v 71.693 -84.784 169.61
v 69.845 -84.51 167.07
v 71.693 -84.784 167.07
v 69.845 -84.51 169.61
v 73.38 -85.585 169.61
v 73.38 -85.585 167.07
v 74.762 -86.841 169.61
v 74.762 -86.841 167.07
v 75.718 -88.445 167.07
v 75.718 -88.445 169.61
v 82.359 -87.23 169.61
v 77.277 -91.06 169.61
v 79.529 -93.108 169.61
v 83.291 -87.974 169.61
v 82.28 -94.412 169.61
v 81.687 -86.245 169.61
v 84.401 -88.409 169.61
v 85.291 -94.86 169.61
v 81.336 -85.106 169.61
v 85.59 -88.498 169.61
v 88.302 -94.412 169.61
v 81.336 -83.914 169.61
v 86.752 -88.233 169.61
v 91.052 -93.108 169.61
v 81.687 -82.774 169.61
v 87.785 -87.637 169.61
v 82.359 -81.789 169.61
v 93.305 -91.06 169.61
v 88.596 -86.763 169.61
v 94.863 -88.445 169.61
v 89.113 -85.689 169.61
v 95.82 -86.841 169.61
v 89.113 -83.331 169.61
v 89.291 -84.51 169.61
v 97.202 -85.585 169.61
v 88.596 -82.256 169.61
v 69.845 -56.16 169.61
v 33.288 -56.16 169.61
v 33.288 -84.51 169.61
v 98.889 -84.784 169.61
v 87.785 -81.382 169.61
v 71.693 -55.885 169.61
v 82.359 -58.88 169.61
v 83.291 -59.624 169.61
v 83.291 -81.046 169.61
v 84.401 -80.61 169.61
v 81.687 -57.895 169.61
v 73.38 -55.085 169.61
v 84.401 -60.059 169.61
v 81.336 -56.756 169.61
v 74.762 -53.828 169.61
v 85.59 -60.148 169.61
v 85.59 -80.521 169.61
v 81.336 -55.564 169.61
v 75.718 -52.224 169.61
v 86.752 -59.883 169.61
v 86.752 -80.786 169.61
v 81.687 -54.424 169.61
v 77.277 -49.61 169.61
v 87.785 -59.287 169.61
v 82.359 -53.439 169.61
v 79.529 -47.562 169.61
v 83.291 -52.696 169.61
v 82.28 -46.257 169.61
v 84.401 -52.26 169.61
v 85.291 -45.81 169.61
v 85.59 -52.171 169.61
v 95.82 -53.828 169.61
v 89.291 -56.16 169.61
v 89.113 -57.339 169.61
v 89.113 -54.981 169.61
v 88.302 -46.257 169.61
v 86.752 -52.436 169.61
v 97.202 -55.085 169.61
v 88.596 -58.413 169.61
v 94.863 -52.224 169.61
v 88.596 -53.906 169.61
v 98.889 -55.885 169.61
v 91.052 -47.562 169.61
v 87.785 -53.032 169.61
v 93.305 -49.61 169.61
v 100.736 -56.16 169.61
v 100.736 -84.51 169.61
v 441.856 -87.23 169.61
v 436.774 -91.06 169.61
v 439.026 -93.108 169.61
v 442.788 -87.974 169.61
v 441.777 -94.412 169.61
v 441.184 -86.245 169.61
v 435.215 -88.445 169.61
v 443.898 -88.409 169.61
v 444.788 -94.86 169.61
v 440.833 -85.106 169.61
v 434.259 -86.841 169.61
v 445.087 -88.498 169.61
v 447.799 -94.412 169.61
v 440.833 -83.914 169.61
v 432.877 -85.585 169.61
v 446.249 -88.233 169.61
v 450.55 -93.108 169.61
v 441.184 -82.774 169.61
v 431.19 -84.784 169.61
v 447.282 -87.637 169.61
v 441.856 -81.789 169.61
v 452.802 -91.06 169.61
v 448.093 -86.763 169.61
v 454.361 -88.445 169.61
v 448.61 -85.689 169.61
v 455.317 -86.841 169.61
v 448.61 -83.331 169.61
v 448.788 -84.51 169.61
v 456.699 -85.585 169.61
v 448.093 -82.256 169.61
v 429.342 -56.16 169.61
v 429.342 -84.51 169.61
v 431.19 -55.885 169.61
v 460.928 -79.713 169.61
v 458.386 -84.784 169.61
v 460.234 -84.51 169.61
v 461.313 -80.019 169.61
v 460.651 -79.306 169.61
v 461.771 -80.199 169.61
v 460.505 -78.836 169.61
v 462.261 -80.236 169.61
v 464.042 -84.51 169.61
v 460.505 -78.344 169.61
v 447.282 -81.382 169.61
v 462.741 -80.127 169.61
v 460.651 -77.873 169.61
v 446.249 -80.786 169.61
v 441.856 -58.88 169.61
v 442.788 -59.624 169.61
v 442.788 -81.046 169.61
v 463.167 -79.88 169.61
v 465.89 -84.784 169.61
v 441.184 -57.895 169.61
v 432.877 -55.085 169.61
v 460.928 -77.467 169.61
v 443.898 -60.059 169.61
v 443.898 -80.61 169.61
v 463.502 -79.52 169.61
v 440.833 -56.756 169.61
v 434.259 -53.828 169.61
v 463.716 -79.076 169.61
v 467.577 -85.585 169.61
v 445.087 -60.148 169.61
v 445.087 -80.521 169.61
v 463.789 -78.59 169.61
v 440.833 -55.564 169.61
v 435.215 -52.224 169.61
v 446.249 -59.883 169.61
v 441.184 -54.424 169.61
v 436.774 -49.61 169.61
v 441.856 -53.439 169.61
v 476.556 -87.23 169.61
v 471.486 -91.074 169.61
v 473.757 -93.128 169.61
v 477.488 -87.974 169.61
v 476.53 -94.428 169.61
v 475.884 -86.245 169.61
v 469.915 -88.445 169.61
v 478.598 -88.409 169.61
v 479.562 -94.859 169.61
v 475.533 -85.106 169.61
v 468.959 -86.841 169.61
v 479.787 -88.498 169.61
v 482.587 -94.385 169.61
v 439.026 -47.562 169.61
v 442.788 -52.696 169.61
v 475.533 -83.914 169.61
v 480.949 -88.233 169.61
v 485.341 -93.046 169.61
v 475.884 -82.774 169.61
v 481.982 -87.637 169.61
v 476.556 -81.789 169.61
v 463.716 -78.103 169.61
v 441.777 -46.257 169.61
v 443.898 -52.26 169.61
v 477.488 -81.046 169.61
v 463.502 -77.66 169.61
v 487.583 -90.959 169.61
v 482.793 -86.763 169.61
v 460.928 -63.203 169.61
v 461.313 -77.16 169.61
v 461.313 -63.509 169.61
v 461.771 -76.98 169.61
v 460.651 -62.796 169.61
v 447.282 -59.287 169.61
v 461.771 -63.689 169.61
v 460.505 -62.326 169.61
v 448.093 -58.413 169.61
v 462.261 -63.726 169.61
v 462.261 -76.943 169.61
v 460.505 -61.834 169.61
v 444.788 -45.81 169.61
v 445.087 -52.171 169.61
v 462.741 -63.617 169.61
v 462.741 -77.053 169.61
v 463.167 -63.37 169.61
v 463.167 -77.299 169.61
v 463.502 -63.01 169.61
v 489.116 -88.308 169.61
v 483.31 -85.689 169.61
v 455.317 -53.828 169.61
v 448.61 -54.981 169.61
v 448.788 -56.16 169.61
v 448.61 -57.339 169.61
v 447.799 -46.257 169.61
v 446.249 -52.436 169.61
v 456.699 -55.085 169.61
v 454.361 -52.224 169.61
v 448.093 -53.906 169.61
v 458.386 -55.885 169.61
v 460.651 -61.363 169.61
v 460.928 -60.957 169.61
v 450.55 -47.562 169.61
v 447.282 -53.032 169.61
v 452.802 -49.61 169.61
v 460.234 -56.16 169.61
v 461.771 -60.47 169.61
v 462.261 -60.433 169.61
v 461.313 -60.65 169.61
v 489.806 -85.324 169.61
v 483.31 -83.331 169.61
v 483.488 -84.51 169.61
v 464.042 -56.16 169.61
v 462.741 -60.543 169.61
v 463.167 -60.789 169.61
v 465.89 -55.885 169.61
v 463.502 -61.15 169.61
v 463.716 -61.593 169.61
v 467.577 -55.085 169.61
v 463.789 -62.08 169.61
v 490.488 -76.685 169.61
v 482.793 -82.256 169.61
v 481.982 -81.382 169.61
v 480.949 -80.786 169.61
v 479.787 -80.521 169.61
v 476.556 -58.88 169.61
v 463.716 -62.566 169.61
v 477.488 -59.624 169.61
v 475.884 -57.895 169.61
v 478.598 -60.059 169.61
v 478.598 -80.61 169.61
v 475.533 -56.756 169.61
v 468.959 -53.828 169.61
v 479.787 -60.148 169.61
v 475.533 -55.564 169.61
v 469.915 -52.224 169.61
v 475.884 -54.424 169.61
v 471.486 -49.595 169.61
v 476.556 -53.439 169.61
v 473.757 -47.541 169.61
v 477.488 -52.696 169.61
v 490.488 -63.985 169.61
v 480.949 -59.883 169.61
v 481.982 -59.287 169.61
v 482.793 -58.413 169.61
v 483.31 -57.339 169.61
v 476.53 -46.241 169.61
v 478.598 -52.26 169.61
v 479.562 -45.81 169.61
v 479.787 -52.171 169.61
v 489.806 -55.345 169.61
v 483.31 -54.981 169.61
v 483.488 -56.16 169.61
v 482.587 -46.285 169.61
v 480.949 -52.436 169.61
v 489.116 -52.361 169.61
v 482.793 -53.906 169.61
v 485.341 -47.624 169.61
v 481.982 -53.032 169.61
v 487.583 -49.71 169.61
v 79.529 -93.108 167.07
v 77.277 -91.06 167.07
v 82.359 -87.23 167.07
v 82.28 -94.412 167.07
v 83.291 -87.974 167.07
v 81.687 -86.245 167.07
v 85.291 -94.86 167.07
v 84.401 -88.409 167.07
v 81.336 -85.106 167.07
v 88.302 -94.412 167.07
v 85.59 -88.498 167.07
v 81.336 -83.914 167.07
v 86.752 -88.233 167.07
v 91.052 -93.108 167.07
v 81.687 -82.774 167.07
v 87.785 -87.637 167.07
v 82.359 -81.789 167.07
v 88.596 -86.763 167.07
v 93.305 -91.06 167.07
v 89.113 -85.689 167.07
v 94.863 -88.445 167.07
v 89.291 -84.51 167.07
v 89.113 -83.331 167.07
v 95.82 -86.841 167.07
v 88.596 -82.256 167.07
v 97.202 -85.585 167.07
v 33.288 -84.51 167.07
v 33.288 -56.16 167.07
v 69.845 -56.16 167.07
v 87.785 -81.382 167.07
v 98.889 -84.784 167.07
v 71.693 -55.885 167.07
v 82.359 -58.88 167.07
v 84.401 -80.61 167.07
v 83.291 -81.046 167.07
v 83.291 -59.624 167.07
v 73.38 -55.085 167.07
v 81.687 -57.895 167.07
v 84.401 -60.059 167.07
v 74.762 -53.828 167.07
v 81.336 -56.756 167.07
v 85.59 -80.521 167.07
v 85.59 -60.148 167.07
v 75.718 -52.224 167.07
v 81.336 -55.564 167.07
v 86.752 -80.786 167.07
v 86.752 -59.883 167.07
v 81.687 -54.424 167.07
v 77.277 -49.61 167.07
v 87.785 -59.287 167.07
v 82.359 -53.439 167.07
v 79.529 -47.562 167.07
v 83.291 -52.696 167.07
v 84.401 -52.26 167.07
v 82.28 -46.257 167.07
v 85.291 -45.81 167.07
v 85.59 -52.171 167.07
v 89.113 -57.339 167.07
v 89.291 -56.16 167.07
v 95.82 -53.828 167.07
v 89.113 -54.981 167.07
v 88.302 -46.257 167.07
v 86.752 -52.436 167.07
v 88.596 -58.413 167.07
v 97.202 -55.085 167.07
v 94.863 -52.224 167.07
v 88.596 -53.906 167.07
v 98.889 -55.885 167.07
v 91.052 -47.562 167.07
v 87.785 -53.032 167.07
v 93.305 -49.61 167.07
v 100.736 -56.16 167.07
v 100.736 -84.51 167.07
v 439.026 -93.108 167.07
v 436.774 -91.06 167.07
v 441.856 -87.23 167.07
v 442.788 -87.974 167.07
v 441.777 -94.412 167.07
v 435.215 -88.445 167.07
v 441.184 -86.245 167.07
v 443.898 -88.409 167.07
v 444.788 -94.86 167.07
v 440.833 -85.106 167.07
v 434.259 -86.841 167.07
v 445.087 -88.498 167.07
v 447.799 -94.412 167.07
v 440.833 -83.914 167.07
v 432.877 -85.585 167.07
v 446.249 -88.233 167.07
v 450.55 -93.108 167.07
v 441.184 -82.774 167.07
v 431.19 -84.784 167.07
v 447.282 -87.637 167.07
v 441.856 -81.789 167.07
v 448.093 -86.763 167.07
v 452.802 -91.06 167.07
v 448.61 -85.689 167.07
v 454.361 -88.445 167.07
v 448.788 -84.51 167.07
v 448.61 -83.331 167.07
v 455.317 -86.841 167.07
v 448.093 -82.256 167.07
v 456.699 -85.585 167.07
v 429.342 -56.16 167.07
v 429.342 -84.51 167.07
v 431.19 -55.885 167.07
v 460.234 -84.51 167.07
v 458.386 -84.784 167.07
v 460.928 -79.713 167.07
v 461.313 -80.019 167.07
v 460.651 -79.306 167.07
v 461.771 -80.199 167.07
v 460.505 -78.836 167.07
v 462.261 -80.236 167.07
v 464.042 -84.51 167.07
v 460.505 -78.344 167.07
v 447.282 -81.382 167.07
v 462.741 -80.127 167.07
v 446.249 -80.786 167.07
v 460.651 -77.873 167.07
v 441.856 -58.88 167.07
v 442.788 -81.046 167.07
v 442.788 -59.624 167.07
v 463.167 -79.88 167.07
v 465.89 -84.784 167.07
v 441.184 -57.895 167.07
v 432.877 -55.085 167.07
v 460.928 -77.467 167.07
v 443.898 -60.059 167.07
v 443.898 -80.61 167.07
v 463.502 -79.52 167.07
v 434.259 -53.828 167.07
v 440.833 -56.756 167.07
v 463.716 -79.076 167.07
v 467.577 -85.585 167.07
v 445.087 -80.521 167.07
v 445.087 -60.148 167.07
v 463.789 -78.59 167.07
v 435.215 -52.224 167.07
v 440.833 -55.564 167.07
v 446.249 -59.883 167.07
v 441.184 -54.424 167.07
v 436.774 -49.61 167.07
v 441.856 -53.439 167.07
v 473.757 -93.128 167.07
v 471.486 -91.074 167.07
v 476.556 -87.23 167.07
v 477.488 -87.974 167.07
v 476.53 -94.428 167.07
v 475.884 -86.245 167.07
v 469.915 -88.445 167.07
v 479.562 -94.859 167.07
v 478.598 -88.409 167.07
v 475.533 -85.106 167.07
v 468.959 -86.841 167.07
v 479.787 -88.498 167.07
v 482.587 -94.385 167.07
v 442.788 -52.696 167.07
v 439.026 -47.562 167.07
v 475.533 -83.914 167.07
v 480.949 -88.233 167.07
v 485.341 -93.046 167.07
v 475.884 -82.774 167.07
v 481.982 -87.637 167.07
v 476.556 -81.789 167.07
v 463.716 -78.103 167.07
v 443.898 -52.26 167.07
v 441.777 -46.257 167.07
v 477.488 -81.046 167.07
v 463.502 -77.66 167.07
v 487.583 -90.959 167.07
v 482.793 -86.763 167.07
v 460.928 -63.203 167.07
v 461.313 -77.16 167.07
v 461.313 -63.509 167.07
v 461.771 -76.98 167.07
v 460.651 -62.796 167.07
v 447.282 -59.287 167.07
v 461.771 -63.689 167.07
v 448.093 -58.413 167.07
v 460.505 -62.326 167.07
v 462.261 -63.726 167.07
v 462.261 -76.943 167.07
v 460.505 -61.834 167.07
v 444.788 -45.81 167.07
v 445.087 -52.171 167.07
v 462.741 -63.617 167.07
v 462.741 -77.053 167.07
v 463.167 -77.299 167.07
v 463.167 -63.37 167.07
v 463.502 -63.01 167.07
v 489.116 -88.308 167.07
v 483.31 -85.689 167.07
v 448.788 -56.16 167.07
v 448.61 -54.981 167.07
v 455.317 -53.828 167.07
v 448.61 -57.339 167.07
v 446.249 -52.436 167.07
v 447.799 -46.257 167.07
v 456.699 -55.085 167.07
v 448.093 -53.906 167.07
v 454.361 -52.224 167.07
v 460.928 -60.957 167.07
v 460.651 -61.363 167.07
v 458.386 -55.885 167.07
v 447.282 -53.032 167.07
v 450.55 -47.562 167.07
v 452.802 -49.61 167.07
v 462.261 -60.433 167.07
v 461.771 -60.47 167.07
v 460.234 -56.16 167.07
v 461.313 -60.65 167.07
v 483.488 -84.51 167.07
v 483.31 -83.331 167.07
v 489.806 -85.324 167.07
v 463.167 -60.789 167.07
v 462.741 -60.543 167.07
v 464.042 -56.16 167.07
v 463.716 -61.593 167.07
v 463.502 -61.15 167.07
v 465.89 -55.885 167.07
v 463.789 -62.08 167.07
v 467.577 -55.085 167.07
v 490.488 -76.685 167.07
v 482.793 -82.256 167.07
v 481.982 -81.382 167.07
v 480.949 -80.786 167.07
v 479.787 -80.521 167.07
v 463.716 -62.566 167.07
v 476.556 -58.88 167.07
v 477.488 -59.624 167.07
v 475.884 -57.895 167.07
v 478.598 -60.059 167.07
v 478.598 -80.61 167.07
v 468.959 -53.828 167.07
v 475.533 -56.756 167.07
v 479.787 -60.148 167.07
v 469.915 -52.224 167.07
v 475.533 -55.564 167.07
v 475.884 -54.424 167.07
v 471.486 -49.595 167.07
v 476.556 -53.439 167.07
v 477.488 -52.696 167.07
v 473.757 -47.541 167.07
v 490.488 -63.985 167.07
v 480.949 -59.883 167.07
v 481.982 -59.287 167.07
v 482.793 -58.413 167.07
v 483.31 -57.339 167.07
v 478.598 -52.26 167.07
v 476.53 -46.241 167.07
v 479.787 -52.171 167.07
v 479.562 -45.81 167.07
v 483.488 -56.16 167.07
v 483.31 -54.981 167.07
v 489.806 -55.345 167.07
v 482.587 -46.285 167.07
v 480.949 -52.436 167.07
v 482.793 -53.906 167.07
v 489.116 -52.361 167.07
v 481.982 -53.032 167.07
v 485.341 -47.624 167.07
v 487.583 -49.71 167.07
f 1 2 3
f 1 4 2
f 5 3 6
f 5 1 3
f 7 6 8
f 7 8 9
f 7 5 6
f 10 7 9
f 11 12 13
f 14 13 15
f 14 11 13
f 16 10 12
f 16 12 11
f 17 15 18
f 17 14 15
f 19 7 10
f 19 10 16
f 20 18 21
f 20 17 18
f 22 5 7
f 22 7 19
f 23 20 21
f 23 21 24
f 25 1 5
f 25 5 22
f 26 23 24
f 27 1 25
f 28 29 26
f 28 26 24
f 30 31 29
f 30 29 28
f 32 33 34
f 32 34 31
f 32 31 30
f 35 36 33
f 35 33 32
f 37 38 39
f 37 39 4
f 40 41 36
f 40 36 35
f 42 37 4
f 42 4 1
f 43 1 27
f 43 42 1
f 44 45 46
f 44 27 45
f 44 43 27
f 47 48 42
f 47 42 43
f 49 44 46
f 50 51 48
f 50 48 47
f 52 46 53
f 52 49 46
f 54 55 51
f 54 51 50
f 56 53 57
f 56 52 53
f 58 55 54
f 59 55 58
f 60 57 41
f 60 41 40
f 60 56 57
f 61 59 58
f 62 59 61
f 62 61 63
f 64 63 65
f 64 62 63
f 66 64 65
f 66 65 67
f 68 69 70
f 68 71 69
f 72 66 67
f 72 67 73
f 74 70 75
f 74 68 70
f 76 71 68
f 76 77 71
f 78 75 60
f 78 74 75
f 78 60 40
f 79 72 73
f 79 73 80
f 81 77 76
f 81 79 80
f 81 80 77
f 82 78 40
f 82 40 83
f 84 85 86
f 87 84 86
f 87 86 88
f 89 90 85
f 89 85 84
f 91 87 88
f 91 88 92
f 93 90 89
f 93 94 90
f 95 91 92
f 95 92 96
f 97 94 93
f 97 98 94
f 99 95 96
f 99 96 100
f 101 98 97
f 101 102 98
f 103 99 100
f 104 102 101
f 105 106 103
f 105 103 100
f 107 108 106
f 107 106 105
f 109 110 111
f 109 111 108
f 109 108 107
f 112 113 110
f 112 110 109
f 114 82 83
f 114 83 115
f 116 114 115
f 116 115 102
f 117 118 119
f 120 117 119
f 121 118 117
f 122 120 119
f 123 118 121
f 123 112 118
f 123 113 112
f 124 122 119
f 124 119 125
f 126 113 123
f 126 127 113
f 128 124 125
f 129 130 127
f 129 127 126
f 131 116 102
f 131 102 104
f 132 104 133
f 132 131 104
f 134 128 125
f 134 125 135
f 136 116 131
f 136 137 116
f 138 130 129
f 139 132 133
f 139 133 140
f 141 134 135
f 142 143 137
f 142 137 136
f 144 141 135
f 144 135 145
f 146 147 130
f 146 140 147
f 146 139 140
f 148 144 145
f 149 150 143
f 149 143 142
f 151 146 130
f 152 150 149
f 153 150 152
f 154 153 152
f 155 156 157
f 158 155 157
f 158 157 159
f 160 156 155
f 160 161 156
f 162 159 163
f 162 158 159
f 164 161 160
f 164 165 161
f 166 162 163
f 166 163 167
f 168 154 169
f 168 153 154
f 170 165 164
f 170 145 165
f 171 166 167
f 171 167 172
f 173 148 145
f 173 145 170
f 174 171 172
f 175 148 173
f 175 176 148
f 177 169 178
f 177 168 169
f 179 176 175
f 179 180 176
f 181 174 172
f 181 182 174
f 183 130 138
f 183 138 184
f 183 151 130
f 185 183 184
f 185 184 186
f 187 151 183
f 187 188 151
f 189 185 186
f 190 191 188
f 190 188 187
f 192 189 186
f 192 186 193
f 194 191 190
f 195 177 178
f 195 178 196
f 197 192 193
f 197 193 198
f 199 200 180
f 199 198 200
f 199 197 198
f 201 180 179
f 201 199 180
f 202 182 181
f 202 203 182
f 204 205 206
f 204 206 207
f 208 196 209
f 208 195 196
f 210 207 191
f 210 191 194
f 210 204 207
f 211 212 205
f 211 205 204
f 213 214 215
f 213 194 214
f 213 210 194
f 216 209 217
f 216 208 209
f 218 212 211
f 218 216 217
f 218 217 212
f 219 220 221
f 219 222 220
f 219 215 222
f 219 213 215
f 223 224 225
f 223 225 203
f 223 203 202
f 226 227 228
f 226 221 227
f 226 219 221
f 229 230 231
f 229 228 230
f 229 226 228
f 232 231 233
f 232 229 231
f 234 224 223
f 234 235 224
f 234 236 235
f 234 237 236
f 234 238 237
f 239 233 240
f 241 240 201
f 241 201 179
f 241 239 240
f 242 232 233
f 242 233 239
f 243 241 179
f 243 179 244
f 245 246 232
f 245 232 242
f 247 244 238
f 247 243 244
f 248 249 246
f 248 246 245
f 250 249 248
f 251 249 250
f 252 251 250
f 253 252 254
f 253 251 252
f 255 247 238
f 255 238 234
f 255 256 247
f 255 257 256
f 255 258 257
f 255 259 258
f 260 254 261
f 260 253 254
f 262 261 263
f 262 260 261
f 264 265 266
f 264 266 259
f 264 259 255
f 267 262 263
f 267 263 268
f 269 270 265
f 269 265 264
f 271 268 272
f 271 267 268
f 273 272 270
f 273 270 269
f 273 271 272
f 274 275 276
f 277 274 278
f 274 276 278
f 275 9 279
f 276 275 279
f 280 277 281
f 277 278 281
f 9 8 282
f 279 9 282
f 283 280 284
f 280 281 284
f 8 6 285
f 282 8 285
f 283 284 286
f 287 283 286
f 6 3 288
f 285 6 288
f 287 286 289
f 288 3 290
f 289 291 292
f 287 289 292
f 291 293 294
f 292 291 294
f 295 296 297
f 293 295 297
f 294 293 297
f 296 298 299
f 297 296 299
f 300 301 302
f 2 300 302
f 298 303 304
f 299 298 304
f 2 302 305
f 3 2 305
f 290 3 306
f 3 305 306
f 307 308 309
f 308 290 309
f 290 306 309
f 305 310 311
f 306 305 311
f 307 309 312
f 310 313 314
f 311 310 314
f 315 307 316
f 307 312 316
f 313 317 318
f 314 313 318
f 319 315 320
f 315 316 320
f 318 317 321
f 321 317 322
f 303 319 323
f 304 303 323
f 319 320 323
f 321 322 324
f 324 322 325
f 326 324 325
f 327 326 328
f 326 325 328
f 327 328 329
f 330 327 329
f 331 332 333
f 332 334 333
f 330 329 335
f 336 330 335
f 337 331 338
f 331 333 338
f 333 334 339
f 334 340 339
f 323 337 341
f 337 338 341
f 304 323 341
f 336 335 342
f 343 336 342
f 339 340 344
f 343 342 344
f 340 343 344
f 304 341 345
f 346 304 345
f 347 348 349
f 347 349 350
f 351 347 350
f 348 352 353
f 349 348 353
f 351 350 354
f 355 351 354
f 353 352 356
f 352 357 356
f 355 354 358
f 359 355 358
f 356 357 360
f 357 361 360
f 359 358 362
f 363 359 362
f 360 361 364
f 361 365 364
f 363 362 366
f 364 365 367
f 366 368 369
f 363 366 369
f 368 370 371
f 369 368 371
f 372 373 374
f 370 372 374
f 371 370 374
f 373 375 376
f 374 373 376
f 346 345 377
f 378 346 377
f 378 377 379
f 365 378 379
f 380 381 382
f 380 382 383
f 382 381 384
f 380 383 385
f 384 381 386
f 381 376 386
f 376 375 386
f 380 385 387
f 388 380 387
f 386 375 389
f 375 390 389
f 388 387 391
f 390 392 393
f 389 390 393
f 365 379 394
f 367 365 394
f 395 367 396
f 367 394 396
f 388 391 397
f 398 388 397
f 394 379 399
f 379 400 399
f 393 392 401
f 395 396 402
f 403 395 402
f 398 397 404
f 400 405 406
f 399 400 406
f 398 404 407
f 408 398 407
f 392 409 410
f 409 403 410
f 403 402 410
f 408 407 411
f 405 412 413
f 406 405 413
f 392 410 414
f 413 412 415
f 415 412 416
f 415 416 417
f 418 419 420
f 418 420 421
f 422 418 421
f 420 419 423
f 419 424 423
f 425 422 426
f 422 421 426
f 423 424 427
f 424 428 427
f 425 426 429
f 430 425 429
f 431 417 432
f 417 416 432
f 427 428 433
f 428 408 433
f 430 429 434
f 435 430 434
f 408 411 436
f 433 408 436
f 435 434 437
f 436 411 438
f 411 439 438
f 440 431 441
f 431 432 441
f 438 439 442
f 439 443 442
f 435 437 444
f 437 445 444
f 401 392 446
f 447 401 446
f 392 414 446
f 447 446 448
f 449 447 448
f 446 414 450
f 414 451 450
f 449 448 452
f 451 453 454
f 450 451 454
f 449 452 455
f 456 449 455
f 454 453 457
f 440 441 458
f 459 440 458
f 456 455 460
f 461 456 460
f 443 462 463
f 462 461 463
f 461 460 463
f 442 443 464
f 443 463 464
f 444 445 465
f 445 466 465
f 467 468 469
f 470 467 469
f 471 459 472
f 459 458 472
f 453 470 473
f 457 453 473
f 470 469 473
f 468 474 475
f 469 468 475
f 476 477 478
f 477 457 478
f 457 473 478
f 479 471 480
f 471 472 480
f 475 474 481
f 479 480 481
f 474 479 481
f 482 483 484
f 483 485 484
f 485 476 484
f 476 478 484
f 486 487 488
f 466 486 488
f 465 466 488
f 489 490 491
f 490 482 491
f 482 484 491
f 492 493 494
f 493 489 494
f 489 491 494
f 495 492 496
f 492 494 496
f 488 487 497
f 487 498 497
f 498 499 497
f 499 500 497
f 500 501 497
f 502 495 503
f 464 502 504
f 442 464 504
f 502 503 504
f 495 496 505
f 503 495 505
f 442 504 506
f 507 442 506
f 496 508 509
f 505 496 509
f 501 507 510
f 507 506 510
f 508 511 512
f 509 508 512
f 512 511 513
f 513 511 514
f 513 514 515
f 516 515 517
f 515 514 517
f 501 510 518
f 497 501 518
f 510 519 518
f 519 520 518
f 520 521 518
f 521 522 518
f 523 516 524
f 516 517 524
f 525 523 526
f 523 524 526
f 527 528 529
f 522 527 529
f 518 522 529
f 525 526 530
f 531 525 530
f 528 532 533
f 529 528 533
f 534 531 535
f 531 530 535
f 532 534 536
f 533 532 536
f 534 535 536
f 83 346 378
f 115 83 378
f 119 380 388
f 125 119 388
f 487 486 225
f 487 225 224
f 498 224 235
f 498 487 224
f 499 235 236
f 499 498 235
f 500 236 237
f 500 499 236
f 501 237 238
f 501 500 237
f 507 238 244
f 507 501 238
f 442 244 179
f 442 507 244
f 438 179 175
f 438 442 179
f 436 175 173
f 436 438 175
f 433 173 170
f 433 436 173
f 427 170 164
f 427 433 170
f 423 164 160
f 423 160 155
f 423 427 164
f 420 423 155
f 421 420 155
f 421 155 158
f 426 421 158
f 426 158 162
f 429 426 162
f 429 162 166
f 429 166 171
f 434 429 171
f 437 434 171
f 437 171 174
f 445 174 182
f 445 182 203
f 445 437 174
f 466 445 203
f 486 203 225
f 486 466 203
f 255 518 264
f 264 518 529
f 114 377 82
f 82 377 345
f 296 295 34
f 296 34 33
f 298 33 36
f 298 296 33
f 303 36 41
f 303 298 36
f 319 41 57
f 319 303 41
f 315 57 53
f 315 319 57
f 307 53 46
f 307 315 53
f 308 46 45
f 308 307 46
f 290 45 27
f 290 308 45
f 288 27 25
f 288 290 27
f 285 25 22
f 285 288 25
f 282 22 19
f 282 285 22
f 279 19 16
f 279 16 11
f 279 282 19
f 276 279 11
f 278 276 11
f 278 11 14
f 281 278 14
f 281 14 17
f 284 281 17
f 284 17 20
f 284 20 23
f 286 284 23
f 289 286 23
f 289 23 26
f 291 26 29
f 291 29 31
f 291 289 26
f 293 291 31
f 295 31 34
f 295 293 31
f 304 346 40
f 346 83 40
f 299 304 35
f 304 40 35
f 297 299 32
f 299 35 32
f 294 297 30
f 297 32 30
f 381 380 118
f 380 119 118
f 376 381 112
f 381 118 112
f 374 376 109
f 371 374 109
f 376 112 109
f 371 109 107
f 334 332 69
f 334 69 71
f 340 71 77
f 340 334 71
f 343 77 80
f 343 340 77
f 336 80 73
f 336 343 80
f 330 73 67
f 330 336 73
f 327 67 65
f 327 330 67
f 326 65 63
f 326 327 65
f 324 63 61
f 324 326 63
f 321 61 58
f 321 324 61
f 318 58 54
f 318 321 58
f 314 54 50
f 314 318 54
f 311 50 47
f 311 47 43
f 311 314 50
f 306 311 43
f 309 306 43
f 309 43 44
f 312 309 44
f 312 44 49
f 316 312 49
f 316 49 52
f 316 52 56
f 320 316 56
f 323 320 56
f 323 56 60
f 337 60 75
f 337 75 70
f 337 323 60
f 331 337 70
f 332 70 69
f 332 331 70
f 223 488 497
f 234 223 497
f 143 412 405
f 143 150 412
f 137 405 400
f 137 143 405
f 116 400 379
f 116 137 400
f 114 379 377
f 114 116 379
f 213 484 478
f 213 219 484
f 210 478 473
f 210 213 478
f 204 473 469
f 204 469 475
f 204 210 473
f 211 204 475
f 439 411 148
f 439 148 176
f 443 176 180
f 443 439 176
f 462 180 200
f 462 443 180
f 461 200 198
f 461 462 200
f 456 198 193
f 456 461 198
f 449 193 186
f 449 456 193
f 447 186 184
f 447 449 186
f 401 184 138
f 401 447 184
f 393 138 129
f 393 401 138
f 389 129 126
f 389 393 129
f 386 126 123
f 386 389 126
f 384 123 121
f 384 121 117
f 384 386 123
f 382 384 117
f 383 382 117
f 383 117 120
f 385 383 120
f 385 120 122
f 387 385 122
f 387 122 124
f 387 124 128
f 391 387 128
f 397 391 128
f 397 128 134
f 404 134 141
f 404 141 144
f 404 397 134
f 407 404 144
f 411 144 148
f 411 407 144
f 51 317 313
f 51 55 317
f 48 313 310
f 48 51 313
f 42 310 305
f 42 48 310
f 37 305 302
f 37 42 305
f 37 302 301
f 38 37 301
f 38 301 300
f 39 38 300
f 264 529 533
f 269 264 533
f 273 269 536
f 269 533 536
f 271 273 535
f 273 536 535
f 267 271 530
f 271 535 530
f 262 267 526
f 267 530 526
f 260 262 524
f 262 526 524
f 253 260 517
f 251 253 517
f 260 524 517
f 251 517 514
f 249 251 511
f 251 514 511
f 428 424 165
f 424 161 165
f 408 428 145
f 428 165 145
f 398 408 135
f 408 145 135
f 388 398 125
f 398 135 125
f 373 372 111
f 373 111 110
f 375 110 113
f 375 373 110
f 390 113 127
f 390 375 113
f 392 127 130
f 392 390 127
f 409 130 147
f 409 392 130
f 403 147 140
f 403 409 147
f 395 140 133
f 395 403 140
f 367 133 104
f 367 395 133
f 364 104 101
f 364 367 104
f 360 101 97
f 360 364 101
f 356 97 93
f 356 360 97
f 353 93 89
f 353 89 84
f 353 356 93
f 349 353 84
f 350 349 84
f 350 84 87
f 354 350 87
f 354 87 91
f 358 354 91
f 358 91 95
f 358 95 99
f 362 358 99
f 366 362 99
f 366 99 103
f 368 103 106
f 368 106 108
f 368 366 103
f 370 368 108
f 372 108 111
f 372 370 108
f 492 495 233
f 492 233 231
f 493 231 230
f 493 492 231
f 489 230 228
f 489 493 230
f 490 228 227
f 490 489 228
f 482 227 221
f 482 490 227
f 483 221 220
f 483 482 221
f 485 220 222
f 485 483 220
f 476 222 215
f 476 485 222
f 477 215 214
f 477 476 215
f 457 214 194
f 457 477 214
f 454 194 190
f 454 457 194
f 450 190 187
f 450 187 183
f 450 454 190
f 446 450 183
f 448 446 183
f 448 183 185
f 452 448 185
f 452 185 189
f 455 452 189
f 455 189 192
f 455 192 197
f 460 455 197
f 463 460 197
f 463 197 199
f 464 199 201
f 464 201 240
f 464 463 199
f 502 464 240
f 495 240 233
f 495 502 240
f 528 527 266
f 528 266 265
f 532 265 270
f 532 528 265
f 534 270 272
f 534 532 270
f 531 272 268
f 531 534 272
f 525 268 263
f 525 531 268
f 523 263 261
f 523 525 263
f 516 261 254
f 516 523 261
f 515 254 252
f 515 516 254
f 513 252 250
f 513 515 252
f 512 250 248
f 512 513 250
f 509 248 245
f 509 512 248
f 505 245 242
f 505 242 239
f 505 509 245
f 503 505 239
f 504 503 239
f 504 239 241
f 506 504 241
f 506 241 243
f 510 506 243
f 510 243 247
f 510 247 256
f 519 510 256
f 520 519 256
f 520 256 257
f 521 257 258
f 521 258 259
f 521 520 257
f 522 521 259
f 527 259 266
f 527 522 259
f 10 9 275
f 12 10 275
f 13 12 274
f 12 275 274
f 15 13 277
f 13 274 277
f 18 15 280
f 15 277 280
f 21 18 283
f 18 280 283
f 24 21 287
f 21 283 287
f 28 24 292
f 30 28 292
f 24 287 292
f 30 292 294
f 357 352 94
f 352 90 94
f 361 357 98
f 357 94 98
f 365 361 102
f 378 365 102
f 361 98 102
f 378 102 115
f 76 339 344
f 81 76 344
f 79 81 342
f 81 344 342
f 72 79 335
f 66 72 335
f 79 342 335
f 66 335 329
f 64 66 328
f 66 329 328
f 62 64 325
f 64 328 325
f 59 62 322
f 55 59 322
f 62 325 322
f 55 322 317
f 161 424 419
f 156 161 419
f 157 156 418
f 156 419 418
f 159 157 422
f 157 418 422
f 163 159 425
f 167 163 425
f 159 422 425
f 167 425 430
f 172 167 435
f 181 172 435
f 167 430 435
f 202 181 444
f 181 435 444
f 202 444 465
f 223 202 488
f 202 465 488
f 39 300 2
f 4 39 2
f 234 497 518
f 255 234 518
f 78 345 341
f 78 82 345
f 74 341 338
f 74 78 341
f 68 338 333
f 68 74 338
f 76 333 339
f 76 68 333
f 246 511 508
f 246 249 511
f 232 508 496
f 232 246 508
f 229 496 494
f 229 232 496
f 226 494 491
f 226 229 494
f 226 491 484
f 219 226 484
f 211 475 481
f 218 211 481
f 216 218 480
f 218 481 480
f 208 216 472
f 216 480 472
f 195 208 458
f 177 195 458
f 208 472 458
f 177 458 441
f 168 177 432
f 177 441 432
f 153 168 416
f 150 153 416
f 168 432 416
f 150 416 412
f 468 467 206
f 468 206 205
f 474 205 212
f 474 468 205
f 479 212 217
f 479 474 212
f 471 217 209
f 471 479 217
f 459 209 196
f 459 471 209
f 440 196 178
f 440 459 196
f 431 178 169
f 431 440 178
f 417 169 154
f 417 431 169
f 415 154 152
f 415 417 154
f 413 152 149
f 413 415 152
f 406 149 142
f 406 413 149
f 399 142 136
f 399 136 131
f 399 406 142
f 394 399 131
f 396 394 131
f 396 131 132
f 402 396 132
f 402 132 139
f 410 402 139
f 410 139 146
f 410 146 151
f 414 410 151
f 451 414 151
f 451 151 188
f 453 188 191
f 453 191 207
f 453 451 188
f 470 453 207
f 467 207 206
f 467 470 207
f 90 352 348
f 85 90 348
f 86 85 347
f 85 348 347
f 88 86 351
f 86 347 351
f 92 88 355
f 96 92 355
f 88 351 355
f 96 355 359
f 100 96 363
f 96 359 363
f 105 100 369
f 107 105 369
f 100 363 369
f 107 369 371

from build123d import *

# Parameters (mm, degrees)
SKETCH2_R           = 4
SKETCH2_R_2         = 1.651
BOSS_EXTRUDE1_DEPTH = 2.54
FILLET2_R           = 6.35


with BuildPart() as part:
    # Sketch2 → Boss-Extrude1 (new body)
    with BuildSketch(Plane(origin=(33.288009597, -76.684680992, 167.069664602), x_dir=(1, 0, 0), z_dir=(0, 0, 1))):
        with BuildLine():
            ThreePointArc((456.517892766, 21.339609639), (445.792378932, 30.866970077), (435.85, 20.525))
            Line((435.85, 20.525), (421.85, 20.525))
            ThreePointArc((421.85, 20.525), (411.5, 30.875), (401.15, 20.525))
            Line((401.15, 20.525), (62.352851741, 20.525))
            ThreePointArc((62.352851741, 20.525), (52.002851741, 30.875), (41.652851741, 20.525))
            Line((41.652851741, 20.525), (0, 20.525))
            Line((0, 20.525), (0, -7.825))
            Line((0, -7.825), (41.652851741, -7.825))
            ThreePointArc((41.652851741, -7.825), (52.002851741, -18.175), (62.352851741, -7.825))
            Line((62.352851741, -7.825), (401.15, -7.825))
            ThreePointArc((401.15, -7.825), (411.5, -18.175), (421.85, -7.825))
            Line((421.85, -7.825), (435.85, -7.825))
            ThreePointArc((435.85, -7.825), (445.792378932, -18.166970077), (456.517892766, -8.639609639))
            Line((456.517892766, -8.639609639), (457.2, 0))
            Line((457.2, 0), (457.2, 12.7))
            Line((457.2, 12.7), (456.517892766, 21.339609639))
        make_face()
        with Locations((52.002851741, -7.825)):
            Circle(SKETCH2_R, mode=Mode.SUBTRACT)
        with Locations((411.5, -7.825)):
            Circle(SKETCH2_R, mode=Mode.SUBTRACT)
        with Locations((428.85, -1.905)):
            Circle(SKETCH2_R_2, mode=Mode.SUBTRACT)
        with Locations((52.002851741, 20.525)):
            Circle(SKETCH2_R, mode=Mode.SUBTRACT)
        with Locations((428.85, 14.605)):
            Circle(SKETCH2_R_2, mode=Mode.SUBTRACT)
        with Locations((411.5, 20.525)):
            Circle(SKETCH2_R, mode=Mode.SUBTRACT)
        with Locations((446.2, 20.525)):
            Circle(SKETCH2_R, mode=Mode.SUBTRACT)
        with Locations((446.2, -7.825)):
            Circle(SKETCH2_R, mode=Mode.SUBTRACT)
    extrude(amount=BOSS_EXTRUDE1_DEPTH)

    # Fillet2
    fillet2_edges = [part.edges().sort_by_distance(p)[0] for p in [
        (95.640861339, -84.509680992, 168.339664602),
        (74.940861339, -84.509680992, 168.339664602),
        (74.940861339, -56.159680992, 168.339664602),
        (95.640861339, -56.159680992, 168.339664602),
        (434.438009597, -56.159680992, 168.339664602),
        (455.138009597, -56.159680992, 168.339664602),
        (469.138009597, -56.159680992, 168.339664602),
        (469.138009597, -84.509680992, 168.339664602),
        (455.138009597, -84.509680992, 168.339664602),
        (434.438009597, -84.509680992, 168.339664602),
    ]]
    fillet(fillet2_edges, radius=FILLET2_R)


solid = part.part
